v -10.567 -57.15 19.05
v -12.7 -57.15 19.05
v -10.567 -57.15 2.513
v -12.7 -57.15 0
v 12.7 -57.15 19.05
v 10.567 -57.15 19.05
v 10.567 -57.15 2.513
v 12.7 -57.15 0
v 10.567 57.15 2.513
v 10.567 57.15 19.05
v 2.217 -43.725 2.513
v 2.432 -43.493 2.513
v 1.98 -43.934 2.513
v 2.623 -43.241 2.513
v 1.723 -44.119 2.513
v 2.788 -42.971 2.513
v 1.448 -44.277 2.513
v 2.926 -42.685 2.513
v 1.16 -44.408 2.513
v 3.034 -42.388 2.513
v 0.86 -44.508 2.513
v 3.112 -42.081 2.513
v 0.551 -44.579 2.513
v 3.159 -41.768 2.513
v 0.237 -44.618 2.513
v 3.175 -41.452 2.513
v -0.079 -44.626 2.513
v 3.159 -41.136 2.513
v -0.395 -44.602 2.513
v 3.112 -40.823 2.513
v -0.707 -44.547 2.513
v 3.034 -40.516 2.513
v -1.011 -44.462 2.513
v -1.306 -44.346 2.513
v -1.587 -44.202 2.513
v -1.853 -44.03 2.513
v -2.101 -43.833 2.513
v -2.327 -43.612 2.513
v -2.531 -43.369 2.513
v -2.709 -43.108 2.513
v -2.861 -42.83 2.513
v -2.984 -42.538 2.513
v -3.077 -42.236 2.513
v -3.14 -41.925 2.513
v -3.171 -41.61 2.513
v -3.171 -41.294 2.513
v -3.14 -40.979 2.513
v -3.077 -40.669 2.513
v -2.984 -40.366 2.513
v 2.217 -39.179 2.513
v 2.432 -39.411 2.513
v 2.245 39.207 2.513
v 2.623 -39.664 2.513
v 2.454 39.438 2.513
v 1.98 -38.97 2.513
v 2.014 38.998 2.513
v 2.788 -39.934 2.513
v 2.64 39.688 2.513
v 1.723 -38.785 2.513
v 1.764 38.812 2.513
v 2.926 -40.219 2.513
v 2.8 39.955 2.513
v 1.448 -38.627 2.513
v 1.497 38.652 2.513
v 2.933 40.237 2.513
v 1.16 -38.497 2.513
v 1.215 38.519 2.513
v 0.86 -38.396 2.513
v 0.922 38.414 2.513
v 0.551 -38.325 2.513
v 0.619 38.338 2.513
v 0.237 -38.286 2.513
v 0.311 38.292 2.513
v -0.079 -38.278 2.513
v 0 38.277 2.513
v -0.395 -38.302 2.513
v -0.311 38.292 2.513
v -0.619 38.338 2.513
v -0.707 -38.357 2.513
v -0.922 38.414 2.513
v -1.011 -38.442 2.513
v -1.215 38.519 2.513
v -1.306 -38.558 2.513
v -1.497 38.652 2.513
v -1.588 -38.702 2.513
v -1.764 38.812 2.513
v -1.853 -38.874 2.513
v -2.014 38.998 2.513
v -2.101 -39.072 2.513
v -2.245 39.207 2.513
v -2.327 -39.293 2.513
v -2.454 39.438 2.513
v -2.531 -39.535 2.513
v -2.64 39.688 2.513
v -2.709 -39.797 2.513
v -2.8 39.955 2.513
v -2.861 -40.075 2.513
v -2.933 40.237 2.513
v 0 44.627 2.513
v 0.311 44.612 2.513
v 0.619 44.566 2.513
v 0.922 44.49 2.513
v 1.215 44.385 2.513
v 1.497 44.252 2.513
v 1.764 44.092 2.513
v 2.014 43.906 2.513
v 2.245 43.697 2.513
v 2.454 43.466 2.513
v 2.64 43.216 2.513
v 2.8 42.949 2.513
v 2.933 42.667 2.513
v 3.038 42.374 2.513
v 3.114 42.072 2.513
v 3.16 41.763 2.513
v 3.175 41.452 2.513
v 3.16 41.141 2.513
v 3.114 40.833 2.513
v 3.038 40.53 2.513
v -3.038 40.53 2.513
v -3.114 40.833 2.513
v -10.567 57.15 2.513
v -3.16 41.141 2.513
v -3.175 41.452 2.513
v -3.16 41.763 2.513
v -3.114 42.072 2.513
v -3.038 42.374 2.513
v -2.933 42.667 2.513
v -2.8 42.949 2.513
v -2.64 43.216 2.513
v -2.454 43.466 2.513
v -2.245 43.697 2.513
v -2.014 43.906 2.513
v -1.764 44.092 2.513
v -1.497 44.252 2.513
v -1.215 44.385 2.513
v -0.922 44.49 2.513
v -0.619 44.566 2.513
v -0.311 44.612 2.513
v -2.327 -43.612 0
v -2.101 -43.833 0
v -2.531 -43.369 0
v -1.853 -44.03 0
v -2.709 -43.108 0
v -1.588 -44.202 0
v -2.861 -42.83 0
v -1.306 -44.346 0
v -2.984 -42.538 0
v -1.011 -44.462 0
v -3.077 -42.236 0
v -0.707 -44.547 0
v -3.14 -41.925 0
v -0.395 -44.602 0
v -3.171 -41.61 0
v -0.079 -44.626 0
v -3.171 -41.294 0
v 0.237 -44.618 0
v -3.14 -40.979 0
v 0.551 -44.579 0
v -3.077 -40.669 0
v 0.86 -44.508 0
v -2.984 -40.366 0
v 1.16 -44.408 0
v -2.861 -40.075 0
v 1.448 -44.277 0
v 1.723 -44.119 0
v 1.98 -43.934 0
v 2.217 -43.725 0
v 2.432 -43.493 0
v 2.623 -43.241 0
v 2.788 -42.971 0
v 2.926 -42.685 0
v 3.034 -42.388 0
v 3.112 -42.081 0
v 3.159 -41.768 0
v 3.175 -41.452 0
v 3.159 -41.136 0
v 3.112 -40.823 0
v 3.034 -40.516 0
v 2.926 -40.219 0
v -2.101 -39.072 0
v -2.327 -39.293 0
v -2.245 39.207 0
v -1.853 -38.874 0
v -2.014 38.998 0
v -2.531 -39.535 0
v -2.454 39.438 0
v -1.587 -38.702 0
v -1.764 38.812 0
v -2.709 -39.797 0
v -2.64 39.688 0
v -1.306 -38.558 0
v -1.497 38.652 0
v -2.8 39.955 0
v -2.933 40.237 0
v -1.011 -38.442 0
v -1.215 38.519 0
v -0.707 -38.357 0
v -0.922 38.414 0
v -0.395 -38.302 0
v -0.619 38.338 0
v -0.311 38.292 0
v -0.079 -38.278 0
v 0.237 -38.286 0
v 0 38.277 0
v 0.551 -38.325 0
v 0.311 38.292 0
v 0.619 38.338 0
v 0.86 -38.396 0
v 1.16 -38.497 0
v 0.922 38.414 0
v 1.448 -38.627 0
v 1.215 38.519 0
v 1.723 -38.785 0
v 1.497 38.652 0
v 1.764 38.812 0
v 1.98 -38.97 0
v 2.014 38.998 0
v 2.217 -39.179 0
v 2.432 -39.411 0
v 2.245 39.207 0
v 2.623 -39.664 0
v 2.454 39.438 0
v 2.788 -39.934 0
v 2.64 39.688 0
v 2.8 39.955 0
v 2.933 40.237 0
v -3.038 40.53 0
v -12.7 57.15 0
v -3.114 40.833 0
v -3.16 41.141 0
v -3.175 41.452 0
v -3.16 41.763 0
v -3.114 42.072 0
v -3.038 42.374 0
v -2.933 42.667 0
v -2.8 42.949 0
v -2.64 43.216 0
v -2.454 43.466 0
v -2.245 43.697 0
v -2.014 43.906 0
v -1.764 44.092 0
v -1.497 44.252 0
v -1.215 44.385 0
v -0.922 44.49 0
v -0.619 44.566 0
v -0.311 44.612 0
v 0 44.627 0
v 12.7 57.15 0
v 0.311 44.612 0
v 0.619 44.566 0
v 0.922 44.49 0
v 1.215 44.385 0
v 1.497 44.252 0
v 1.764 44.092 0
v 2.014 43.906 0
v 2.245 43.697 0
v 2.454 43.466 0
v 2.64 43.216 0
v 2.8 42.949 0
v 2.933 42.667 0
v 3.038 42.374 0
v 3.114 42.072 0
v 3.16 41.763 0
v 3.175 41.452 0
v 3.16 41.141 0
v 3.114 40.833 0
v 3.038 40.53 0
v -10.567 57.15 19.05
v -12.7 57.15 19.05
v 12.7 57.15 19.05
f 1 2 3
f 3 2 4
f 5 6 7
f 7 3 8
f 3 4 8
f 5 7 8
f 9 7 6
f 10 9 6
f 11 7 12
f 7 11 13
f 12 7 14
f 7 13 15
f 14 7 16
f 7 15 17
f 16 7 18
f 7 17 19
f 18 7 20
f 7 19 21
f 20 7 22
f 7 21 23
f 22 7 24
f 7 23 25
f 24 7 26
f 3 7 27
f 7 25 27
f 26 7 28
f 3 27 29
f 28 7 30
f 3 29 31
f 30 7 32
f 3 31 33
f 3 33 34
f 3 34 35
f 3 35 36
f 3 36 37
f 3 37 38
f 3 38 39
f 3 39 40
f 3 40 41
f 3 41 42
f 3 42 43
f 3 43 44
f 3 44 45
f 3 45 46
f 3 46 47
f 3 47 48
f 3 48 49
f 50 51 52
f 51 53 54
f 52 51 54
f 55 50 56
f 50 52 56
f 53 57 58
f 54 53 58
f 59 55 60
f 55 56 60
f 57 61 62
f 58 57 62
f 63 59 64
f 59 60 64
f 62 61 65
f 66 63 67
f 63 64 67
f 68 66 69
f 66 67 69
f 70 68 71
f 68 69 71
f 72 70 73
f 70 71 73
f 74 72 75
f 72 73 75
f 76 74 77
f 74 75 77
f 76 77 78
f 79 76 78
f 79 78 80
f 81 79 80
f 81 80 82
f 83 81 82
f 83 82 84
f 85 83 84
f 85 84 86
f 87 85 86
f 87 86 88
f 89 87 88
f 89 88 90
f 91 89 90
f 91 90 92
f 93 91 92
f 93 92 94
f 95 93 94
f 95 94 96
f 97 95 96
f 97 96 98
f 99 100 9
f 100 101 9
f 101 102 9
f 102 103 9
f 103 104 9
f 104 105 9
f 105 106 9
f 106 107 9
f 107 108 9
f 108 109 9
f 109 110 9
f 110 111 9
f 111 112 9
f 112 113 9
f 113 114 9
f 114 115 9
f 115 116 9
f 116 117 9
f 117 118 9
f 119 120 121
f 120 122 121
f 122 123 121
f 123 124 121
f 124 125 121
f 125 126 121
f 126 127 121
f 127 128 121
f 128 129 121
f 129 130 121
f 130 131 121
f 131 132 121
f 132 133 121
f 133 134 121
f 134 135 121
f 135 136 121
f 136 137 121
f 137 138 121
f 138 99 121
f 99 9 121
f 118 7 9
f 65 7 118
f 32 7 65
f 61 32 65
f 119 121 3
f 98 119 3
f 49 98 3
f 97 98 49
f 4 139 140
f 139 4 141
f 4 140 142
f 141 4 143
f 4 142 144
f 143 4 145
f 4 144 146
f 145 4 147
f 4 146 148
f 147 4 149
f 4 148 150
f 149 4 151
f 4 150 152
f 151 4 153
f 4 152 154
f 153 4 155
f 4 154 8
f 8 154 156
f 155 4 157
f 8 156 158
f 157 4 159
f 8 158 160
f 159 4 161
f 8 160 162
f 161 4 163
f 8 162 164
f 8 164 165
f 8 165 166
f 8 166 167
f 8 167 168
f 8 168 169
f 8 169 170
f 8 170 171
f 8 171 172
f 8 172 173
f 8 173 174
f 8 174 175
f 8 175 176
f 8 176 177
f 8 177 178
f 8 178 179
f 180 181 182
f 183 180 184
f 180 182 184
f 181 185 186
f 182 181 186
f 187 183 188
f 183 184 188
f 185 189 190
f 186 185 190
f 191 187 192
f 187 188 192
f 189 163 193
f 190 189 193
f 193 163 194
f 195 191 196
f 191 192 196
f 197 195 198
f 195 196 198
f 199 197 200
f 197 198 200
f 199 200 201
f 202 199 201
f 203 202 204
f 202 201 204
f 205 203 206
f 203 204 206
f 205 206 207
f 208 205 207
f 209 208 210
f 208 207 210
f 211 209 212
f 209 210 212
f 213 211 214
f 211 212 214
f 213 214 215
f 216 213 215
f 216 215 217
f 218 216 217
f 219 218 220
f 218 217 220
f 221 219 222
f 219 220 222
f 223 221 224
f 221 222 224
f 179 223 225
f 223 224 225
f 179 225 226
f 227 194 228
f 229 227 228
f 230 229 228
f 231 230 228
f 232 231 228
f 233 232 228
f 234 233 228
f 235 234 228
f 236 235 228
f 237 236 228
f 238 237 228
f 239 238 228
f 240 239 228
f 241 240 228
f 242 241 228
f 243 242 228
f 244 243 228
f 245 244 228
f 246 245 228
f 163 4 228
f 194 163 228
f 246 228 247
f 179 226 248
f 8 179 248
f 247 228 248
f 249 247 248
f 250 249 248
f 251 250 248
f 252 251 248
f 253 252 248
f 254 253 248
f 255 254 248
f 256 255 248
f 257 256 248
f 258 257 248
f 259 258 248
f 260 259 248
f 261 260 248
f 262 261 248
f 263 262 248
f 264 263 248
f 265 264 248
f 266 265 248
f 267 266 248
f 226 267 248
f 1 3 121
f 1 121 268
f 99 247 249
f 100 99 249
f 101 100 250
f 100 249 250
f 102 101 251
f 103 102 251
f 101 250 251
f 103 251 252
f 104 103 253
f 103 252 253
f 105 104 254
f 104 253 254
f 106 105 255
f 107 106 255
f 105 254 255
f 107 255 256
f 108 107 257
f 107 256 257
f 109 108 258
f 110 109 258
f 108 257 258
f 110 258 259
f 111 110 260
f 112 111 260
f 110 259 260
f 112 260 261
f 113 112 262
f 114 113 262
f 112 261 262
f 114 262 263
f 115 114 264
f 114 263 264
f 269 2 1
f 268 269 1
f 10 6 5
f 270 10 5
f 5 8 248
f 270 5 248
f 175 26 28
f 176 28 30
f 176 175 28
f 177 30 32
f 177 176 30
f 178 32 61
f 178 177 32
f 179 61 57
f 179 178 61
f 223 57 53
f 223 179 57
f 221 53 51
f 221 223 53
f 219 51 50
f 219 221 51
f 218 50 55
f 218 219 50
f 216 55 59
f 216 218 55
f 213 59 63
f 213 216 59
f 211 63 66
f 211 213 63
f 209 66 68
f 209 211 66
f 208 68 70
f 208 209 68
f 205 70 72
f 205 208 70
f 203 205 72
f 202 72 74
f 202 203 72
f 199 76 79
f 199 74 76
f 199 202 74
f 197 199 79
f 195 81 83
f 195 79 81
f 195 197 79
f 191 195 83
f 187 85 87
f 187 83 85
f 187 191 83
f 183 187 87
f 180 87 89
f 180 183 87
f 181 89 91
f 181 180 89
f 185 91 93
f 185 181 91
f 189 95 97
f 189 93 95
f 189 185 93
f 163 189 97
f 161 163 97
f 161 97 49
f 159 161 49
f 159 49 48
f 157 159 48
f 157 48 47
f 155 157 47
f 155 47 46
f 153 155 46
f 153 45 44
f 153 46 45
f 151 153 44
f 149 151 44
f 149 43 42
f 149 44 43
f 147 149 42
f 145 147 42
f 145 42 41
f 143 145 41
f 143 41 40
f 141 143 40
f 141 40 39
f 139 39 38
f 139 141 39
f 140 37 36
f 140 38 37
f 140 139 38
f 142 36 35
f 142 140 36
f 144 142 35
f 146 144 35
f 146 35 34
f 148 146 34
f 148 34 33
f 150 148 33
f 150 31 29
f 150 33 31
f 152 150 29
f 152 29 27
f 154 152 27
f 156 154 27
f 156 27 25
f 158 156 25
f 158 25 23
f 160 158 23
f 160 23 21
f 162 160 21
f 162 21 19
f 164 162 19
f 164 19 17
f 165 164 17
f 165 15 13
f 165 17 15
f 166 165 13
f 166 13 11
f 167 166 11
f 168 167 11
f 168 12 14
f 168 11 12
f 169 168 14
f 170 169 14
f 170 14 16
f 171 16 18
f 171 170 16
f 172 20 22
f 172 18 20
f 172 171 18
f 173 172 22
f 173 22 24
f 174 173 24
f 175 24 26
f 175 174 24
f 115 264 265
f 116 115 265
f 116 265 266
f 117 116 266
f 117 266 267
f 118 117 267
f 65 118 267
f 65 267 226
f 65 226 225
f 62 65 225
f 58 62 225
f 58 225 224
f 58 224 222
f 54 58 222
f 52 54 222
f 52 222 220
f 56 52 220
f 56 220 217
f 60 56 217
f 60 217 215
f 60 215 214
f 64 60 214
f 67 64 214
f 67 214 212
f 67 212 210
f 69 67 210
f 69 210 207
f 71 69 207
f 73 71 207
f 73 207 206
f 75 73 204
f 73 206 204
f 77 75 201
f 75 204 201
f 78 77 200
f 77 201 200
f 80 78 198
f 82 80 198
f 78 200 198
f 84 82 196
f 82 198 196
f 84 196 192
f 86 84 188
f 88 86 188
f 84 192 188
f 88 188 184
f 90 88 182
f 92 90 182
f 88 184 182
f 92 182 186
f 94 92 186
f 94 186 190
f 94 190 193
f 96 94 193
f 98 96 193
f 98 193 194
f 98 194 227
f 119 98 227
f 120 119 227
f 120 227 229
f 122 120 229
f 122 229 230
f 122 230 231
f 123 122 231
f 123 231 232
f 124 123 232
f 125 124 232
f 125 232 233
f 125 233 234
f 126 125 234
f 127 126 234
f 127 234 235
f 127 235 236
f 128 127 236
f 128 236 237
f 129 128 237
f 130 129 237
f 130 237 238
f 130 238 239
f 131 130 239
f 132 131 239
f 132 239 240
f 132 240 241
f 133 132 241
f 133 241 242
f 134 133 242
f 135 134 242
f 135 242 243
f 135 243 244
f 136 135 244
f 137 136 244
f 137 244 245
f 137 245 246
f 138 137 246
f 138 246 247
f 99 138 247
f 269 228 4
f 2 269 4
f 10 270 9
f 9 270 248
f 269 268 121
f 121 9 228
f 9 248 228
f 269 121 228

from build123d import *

# Parameters (mm, degrees)
F0_R     = 3.175
F1_DEPTH = 19.05
F2_W     = 21.134718
F2_H     = 23.147546
F3_DEPTH = 140.54349


with BuildPart() as f1:
    # F0 (on Top) → F1 (new body)
    with BuildSketch(Plane.XY):
        with BuildLine():
            ThreePointArc((3.175, 41.452094), (2.245064, 43.697158), (0, 44.627094))
            ThreePointArc((0, 44.627094), (-2.245064, 39.20703), (3.175, 41.452094))
        make_face()
        Polygon((-12.7, -57.15), (12.7, -57.15), (12.7, 57.15), (0, 57.15), (-12.7, 57.15), align=None)
        with Locations((0, -41.452094)):
            Circle(F0_R, mode=Mode.SUBTRACT)
        with BuildLine():
            ThreePointArc((3.175, 41.452094), (-2.245064, 39.20703), (0, 44.627094))
            ThreePointArc((0, 44.627094), (2.245064, 43.697158), (3.175, 41.452094))
        make_face(mode=Mode.SUBTRACT)
    extrude(amount=F1_DEPTH)

    # F2 (on face) → F3 (cut)
    with BuildSketch(Plane(origin=(0, 57.15, 0), x_dir=(-1, 0, 0), z_dir=(0, 1, 0))):
        with Locations((0, 14.087191)):
            Rectangle(F2_W, F2_H)
    extrude(amount=-F3_DEPTH, mode=Mode.SUBTRACT)


solid = f1.part
